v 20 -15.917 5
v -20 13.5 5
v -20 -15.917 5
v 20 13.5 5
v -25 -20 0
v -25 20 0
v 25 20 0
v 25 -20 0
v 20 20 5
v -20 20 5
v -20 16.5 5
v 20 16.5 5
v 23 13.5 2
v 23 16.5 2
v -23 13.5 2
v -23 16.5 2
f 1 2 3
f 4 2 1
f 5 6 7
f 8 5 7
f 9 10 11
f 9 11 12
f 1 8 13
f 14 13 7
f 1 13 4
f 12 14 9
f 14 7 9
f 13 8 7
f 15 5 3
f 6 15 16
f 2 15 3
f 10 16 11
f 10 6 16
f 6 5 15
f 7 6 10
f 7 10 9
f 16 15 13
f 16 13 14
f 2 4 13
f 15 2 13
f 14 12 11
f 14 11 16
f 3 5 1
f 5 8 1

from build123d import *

# Parameters (mm, degrees)
SKETCH1_W               = 50
SKETCH1_H               = 40
BOSS_EXTRUDE1_DEPTH     = 5
CUT_EXTRUDE1_DEPTH      = 21
CUT_EXTRUDE1_DEPTH_BACK = 21
CUT_EXTRUDE2_DEPTH      = 26
CUT_EXTRUDE2_DEPTH_BACK = 26
SKETCH4_W               = 3
SKETCH4_H               = 3
CUT_EXTRUDE3_DEPTH      = 26
CUT_EXTRUDE3_DEPTH_BACK = 26


with BuildPart() as part:
    # Sketch1 → Boss-Extrude1 (new body)
    with BuildSketch(Plane.XY):
        Rectangle(SKETCH1_W, SKETCH1_H)
    extrude(amount=BOSS_EXTRUDE1_DEPTH)

    # Sketch2 → Cut-Extrude1 (cut, two sides)
    with BuildSketch(Plane(origin=(0, 0, 0), x_dir=(1, 0, 0), z_dir=(0, 1, 0))) as cut_extrude1_sk:
        Polygon((-25, 0), (-20, -5), (-25, -5), align=None)
        Polygon((25, 0), (20, -5), (25, -5), align=None)
    extrude(amount=CUT_EXTRUDE1_DEPTH, mode=Mode.SUBTRACT)
    extrude(cut_extrude1_sk.sketch, amount=-CUT_EXTRUDE1_DEPTH_BACK, mode=Mode.SUBTRACT)

    # Sketch3 → Cut-Extrude2 (cut, two sides)
    with BuildSketch(Plane(origin=(0, 0, 0), x_dir=(0, 0, -1), z_dir=(1, 0, 0))) as cut_extrude2_sk:
        Polygon((0, -20), (-5, -15.916820135), (-5, -20), align=None)
    extrude(amount=CUT_EXTRUDE2_DEPTH, mode=Mode.SUBTRACT)
    extrude(cut_extrude2_sk.sketch, amount=-CUT_EXTRUDE2_DEPTH_BACK, mode=Mode.SUBTRACT)

    # Sketch4 → Cut-Extrude3 (cut, two sides)
    with BuildSketch(Plane(origin=(0, 0, 0), x_dir=(0, 0, -1), z_dir=(1, 0, 0))) as cut_extrude3_sk:
        with Locations((-3.5, 15)):
            Rectangle(SKETCH4_W, SKETCH4_H)
    extrude(amount=CUT_EXTRUDE3_DEPTH, mode=Mode.SUBTRACT)
    extrude(cut_extrude3_sk.sketch, amount=-CUT_EXTRUDE3_DEPTH_BACK, mode=Mode.SUBTRACT)


solid = part.part
